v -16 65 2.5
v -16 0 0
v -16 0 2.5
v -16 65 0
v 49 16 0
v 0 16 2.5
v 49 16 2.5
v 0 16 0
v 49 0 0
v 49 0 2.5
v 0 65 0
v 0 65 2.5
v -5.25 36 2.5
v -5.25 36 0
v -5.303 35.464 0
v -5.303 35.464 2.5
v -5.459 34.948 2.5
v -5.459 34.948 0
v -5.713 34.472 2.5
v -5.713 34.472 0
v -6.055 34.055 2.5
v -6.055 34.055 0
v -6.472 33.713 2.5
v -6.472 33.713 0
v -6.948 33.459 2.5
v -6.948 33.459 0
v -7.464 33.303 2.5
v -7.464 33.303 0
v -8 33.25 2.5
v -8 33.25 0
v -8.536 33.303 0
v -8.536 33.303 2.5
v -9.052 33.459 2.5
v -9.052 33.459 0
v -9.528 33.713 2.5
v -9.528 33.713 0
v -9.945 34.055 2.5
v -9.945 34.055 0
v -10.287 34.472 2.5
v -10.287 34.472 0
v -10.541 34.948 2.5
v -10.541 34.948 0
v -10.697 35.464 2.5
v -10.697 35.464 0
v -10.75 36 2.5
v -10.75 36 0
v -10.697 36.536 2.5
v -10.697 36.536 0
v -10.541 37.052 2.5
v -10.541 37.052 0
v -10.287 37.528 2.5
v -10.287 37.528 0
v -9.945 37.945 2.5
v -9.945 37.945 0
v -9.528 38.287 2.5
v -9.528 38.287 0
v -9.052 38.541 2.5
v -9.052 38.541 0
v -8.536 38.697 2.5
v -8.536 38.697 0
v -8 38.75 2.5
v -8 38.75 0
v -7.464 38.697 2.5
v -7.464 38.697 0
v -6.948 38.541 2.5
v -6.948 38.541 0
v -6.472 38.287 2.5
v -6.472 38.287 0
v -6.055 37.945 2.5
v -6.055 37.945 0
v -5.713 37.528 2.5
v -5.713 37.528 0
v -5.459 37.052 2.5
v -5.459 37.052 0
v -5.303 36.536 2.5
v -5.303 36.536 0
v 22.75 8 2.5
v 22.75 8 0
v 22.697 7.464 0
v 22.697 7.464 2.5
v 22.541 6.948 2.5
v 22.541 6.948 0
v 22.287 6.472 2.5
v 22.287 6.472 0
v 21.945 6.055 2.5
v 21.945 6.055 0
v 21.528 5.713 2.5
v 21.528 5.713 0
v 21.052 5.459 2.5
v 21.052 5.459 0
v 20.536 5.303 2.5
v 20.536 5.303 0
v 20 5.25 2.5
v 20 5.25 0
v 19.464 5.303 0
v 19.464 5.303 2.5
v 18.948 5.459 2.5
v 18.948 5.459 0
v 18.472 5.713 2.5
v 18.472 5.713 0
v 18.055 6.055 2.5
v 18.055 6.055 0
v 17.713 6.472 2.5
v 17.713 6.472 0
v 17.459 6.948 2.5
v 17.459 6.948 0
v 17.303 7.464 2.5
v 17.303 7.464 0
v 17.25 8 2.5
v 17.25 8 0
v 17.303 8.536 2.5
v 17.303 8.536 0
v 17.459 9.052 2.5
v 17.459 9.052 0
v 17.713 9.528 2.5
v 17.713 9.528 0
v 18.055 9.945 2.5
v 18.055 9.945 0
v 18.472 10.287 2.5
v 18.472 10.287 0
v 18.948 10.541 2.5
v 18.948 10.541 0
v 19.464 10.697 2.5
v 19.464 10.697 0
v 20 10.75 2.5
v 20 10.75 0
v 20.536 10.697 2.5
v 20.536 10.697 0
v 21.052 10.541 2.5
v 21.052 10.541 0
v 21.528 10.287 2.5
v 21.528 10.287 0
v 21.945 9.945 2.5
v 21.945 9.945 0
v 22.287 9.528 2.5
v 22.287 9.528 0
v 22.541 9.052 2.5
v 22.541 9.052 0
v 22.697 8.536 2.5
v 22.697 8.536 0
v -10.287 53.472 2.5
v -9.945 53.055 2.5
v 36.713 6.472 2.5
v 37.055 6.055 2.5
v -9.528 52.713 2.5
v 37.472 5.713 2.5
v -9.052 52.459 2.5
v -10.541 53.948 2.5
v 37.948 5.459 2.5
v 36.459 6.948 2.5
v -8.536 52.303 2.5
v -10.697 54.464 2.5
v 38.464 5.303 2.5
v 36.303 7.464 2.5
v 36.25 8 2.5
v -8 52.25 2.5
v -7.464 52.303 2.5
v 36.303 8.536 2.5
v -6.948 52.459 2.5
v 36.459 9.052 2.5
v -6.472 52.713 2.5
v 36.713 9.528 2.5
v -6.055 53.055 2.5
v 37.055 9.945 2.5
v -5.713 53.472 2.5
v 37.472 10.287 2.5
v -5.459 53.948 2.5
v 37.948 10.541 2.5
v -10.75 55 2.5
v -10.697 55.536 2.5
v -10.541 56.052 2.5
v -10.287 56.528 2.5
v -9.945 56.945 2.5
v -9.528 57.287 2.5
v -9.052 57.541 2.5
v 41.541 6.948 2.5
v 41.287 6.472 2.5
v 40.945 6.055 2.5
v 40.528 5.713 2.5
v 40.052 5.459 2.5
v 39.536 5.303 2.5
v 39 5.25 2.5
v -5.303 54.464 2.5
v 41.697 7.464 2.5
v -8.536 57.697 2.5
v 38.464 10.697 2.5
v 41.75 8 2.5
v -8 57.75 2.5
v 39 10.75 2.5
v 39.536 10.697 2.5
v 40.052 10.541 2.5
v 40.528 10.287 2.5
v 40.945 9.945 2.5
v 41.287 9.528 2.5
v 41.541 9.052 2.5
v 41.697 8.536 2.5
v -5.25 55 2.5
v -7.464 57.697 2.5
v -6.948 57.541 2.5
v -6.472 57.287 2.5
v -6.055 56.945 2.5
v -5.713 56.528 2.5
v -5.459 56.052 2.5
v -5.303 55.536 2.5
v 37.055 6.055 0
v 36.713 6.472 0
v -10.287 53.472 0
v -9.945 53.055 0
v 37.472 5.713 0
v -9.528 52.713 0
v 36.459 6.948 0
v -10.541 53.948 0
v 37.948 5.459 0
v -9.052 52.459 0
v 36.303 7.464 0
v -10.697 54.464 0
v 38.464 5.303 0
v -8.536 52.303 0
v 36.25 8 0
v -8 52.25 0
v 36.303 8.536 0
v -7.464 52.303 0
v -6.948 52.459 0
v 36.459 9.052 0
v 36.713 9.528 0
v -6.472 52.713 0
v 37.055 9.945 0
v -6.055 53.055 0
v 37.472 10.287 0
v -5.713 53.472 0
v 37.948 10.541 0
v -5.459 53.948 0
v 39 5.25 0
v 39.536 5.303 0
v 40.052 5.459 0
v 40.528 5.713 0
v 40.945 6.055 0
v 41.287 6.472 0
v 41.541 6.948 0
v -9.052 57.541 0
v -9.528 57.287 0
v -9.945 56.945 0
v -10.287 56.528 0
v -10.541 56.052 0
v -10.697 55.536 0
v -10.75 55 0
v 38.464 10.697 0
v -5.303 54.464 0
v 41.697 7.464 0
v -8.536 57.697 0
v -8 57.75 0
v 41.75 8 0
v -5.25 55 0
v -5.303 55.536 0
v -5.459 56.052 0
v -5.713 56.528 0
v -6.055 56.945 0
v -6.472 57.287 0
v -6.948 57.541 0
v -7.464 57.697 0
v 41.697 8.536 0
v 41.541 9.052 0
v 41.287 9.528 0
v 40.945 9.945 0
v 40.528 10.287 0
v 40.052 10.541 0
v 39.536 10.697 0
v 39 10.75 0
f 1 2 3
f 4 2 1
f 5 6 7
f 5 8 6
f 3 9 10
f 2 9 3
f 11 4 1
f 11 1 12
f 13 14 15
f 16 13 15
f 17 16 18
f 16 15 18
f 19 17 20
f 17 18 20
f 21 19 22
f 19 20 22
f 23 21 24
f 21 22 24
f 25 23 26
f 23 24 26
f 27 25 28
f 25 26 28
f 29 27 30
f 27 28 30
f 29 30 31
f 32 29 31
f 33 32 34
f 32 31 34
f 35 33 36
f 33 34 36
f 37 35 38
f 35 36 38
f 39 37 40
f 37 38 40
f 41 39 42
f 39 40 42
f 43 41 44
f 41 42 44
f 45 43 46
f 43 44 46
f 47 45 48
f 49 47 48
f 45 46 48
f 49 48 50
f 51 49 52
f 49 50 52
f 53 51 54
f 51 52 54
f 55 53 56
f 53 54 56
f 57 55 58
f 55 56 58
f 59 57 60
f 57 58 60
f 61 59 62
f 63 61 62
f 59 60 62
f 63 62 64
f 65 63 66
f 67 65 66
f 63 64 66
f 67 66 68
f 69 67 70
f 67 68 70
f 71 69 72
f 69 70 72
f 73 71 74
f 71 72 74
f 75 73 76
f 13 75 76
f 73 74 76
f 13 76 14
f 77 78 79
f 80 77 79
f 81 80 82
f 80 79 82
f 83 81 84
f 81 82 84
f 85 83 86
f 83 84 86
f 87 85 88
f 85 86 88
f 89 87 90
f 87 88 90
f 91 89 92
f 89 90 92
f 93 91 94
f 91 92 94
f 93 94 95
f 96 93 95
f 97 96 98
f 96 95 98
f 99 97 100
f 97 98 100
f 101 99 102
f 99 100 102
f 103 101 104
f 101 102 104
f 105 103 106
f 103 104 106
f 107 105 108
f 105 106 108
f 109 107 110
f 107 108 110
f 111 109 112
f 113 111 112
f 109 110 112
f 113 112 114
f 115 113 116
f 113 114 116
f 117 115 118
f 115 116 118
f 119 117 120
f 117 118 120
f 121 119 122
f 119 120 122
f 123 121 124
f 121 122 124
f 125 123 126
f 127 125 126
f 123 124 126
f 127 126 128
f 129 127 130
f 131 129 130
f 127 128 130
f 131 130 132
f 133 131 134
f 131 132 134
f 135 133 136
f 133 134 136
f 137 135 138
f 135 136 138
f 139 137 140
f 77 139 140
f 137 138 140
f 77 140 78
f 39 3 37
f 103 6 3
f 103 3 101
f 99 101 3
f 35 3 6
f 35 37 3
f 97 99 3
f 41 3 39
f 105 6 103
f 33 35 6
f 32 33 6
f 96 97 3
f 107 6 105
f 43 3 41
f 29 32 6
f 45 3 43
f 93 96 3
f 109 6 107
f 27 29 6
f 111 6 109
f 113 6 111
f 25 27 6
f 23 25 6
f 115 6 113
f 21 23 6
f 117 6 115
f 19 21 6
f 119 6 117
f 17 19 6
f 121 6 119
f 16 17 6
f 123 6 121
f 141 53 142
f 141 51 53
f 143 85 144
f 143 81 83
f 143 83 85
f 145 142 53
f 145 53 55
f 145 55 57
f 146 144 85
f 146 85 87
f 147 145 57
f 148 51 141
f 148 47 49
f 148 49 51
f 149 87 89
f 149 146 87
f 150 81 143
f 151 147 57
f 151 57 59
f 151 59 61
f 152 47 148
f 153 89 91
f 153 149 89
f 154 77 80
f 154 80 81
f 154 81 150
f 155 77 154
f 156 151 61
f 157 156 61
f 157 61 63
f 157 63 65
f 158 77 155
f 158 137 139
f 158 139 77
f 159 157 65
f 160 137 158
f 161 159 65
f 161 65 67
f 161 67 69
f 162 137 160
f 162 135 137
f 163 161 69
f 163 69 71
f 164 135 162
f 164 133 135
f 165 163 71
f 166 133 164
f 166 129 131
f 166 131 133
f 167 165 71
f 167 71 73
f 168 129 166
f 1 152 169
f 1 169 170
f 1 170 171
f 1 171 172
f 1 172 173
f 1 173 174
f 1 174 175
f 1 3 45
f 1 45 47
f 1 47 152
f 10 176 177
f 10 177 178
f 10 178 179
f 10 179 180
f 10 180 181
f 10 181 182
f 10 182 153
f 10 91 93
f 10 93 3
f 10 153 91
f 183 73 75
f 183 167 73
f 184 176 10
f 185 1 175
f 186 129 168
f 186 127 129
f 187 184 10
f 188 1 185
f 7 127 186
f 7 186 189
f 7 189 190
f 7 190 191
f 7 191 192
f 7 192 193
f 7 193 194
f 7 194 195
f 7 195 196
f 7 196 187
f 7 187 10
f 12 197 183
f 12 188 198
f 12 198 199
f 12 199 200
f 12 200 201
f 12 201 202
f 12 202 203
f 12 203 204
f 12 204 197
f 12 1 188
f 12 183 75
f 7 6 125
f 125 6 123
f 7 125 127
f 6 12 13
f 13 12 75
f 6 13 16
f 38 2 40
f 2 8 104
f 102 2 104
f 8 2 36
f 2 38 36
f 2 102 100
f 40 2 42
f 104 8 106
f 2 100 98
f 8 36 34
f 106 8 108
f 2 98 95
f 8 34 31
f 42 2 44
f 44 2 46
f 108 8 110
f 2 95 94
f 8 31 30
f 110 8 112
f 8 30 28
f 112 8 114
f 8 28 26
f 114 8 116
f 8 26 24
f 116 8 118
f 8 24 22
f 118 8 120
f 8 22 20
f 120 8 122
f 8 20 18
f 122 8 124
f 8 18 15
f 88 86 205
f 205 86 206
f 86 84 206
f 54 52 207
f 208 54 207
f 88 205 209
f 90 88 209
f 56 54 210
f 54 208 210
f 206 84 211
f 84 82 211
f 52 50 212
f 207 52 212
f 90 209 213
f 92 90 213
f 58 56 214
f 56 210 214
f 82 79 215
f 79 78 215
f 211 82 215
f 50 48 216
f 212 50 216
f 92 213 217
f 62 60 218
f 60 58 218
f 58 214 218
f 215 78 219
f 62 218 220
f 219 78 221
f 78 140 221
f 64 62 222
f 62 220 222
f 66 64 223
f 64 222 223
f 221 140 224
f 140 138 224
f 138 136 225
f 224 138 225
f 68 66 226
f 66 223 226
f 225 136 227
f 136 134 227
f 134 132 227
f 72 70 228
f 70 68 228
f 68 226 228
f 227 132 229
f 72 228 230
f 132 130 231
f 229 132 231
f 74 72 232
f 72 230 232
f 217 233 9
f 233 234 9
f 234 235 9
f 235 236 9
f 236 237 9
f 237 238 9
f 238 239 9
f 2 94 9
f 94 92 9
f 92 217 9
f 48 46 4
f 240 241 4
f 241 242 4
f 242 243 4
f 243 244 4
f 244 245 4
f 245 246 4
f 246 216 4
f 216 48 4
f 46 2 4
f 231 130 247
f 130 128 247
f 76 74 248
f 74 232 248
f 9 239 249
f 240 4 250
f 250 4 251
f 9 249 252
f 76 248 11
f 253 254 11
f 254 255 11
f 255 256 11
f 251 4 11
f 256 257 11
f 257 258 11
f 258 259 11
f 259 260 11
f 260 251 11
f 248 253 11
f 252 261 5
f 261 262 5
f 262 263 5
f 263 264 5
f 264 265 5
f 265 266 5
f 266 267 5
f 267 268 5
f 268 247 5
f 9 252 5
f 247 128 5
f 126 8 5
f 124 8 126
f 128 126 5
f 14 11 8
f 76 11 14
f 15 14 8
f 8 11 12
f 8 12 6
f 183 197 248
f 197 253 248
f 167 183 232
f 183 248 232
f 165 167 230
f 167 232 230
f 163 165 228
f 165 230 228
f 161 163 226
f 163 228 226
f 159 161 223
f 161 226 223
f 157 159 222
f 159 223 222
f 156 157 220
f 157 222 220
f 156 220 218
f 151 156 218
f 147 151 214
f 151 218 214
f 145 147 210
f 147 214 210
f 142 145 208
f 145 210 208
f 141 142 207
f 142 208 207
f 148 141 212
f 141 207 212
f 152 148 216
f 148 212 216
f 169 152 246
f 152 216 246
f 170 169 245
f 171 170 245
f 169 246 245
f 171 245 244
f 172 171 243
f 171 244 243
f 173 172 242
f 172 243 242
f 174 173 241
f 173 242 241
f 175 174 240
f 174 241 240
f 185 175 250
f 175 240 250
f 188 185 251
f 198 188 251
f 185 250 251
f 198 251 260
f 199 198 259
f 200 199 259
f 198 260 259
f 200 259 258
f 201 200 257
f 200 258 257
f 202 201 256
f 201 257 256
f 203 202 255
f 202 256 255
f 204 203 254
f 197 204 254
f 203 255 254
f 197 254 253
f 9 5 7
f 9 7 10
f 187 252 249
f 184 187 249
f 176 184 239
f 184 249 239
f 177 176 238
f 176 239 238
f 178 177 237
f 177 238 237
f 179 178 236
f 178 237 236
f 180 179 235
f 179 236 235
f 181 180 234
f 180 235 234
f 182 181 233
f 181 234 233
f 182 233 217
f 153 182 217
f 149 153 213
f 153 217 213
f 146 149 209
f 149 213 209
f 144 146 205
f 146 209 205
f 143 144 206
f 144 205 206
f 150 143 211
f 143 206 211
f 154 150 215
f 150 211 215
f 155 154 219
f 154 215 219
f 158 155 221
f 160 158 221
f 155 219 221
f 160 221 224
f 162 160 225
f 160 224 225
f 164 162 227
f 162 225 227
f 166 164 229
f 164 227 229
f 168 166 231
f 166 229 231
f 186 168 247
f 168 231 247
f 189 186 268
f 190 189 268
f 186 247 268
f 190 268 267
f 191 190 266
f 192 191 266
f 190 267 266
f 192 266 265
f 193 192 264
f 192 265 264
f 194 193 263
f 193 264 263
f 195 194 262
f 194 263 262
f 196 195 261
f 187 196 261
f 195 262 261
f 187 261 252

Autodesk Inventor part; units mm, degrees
ref_plane "YZ Plane" through (0, 0, 0) normal (1, 0, 0) x (0, 1, 0)
ref_plane "XZ Plane" through (0, 0, 0) normal (0, 1, 0) x (-1, 0, 0)
ref_plane "XY Plane" through (0, 0, 0) normal (0, 0, 1) x (1, 0, 0)
sketch "草图1" plane through (0, 0, 0) normal (0, 0, 1) x (1, 0, 0)
  line L0 (0, 0) -> (-16, 0)
  line L1 (-16, 0) -> (-16, 65)
  line L2 (-16, 65) -> (0, 65)
  line L3 (0, 65) -> (0, 0)
  line L4 (-16, 16) -> (49, 16)
  line L5 (49, 16) -> (49, 0)
  line L6 (49, 0) -> (-16, 0)
  line L7 (-16, 0) -> (-16, 16)
  line L8 (-8, 65) -> (-8, 0)
  line L9 (-16, 8) -> (49, 8)
  circle A0 centre (-8, 55) radius 2.75
  circle A1 centre (-8, 36) radius 2.75
  circle A2 centre (39, 8) radius 2.75
  circle A3 centre (20, 8) radius 2.75
  point P0 (0, 16)
  dimension "d0" = 65
  dimension "d1" = 65
  dimension "d2" = 16
  dimension "d3" = 16
  dimension "d4" = 5.5
  dimension "d5" = 5.5
  dimension "d6" = 19
  dimension "d7" = 10
  dimension "d8" = 5.5
  dimension "d9" = 5.5
  dimension "d10" = 19
  dimension "d11" = 10
extrude "拉伸1" add sketch "草图1" along normal blind 2.5 contours L0 L8 L9 L3 | L3 L9 A3 A2 L5 L6 | L0 L1 L9 L8 | L9 L8 L4 L3 | L3 L4 L5 L9 A2 A3 | L9 L1 L4 L8 | L4 L8 A1 A0 L2 L3 | L4 L1 L2 L8 A0 A1
properties part number "L型"
